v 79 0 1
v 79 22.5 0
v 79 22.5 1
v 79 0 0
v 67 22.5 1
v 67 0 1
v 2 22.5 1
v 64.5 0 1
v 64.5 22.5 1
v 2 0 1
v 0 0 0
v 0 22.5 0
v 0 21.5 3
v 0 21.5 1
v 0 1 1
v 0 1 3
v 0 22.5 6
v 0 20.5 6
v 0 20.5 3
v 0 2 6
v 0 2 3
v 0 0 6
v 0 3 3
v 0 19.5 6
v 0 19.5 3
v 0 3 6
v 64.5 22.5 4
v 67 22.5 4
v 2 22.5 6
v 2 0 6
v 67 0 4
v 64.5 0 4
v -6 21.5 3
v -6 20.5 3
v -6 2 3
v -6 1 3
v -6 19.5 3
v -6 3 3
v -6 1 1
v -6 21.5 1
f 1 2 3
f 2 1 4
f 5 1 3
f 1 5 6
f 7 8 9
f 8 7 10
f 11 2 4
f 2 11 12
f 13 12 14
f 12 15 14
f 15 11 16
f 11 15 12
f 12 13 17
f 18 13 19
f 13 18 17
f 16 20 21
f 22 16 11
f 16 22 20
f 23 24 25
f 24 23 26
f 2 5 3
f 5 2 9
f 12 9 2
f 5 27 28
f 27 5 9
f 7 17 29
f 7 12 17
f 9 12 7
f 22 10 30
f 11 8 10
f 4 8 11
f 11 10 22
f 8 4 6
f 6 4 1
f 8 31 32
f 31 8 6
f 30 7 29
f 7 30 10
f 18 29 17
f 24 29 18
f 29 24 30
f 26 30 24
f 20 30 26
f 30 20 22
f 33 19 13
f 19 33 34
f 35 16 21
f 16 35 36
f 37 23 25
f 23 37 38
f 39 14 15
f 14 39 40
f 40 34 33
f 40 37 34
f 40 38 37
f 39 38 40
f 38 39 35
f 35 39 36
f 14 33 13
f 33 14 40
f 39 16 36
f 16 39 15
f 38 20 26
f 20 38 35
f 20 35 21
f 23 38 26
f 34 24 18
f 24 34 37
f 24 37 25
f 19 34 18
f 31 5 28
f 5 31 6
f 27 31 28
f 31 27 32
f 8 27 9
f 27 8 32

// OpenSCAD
module triangle(l, w, h) {
    polyhedron(
        points=[[0,0,0], [l,0,0], [l,w,0], [0,w,0], [0,w,h], [l,w,h]],
        faces=[[0,1,2,3],[5,4,3,2],[0,4,5,1],[0,3,4],[5,2,1]]
    );
}

cube([79,22.5,1],false);
cube([2,22.5,6],false);
translate([-6,1,1]) cube([6,20.5,2],false);
translate([-6,3,3]) rotate(-90) triangle(1,6,3);
translate([-6,22.5-2,3]) rotate(-90) triangle(1,6,3);
translate([79-14.5,0,1]) cube([2.5,22.5,3],false);
